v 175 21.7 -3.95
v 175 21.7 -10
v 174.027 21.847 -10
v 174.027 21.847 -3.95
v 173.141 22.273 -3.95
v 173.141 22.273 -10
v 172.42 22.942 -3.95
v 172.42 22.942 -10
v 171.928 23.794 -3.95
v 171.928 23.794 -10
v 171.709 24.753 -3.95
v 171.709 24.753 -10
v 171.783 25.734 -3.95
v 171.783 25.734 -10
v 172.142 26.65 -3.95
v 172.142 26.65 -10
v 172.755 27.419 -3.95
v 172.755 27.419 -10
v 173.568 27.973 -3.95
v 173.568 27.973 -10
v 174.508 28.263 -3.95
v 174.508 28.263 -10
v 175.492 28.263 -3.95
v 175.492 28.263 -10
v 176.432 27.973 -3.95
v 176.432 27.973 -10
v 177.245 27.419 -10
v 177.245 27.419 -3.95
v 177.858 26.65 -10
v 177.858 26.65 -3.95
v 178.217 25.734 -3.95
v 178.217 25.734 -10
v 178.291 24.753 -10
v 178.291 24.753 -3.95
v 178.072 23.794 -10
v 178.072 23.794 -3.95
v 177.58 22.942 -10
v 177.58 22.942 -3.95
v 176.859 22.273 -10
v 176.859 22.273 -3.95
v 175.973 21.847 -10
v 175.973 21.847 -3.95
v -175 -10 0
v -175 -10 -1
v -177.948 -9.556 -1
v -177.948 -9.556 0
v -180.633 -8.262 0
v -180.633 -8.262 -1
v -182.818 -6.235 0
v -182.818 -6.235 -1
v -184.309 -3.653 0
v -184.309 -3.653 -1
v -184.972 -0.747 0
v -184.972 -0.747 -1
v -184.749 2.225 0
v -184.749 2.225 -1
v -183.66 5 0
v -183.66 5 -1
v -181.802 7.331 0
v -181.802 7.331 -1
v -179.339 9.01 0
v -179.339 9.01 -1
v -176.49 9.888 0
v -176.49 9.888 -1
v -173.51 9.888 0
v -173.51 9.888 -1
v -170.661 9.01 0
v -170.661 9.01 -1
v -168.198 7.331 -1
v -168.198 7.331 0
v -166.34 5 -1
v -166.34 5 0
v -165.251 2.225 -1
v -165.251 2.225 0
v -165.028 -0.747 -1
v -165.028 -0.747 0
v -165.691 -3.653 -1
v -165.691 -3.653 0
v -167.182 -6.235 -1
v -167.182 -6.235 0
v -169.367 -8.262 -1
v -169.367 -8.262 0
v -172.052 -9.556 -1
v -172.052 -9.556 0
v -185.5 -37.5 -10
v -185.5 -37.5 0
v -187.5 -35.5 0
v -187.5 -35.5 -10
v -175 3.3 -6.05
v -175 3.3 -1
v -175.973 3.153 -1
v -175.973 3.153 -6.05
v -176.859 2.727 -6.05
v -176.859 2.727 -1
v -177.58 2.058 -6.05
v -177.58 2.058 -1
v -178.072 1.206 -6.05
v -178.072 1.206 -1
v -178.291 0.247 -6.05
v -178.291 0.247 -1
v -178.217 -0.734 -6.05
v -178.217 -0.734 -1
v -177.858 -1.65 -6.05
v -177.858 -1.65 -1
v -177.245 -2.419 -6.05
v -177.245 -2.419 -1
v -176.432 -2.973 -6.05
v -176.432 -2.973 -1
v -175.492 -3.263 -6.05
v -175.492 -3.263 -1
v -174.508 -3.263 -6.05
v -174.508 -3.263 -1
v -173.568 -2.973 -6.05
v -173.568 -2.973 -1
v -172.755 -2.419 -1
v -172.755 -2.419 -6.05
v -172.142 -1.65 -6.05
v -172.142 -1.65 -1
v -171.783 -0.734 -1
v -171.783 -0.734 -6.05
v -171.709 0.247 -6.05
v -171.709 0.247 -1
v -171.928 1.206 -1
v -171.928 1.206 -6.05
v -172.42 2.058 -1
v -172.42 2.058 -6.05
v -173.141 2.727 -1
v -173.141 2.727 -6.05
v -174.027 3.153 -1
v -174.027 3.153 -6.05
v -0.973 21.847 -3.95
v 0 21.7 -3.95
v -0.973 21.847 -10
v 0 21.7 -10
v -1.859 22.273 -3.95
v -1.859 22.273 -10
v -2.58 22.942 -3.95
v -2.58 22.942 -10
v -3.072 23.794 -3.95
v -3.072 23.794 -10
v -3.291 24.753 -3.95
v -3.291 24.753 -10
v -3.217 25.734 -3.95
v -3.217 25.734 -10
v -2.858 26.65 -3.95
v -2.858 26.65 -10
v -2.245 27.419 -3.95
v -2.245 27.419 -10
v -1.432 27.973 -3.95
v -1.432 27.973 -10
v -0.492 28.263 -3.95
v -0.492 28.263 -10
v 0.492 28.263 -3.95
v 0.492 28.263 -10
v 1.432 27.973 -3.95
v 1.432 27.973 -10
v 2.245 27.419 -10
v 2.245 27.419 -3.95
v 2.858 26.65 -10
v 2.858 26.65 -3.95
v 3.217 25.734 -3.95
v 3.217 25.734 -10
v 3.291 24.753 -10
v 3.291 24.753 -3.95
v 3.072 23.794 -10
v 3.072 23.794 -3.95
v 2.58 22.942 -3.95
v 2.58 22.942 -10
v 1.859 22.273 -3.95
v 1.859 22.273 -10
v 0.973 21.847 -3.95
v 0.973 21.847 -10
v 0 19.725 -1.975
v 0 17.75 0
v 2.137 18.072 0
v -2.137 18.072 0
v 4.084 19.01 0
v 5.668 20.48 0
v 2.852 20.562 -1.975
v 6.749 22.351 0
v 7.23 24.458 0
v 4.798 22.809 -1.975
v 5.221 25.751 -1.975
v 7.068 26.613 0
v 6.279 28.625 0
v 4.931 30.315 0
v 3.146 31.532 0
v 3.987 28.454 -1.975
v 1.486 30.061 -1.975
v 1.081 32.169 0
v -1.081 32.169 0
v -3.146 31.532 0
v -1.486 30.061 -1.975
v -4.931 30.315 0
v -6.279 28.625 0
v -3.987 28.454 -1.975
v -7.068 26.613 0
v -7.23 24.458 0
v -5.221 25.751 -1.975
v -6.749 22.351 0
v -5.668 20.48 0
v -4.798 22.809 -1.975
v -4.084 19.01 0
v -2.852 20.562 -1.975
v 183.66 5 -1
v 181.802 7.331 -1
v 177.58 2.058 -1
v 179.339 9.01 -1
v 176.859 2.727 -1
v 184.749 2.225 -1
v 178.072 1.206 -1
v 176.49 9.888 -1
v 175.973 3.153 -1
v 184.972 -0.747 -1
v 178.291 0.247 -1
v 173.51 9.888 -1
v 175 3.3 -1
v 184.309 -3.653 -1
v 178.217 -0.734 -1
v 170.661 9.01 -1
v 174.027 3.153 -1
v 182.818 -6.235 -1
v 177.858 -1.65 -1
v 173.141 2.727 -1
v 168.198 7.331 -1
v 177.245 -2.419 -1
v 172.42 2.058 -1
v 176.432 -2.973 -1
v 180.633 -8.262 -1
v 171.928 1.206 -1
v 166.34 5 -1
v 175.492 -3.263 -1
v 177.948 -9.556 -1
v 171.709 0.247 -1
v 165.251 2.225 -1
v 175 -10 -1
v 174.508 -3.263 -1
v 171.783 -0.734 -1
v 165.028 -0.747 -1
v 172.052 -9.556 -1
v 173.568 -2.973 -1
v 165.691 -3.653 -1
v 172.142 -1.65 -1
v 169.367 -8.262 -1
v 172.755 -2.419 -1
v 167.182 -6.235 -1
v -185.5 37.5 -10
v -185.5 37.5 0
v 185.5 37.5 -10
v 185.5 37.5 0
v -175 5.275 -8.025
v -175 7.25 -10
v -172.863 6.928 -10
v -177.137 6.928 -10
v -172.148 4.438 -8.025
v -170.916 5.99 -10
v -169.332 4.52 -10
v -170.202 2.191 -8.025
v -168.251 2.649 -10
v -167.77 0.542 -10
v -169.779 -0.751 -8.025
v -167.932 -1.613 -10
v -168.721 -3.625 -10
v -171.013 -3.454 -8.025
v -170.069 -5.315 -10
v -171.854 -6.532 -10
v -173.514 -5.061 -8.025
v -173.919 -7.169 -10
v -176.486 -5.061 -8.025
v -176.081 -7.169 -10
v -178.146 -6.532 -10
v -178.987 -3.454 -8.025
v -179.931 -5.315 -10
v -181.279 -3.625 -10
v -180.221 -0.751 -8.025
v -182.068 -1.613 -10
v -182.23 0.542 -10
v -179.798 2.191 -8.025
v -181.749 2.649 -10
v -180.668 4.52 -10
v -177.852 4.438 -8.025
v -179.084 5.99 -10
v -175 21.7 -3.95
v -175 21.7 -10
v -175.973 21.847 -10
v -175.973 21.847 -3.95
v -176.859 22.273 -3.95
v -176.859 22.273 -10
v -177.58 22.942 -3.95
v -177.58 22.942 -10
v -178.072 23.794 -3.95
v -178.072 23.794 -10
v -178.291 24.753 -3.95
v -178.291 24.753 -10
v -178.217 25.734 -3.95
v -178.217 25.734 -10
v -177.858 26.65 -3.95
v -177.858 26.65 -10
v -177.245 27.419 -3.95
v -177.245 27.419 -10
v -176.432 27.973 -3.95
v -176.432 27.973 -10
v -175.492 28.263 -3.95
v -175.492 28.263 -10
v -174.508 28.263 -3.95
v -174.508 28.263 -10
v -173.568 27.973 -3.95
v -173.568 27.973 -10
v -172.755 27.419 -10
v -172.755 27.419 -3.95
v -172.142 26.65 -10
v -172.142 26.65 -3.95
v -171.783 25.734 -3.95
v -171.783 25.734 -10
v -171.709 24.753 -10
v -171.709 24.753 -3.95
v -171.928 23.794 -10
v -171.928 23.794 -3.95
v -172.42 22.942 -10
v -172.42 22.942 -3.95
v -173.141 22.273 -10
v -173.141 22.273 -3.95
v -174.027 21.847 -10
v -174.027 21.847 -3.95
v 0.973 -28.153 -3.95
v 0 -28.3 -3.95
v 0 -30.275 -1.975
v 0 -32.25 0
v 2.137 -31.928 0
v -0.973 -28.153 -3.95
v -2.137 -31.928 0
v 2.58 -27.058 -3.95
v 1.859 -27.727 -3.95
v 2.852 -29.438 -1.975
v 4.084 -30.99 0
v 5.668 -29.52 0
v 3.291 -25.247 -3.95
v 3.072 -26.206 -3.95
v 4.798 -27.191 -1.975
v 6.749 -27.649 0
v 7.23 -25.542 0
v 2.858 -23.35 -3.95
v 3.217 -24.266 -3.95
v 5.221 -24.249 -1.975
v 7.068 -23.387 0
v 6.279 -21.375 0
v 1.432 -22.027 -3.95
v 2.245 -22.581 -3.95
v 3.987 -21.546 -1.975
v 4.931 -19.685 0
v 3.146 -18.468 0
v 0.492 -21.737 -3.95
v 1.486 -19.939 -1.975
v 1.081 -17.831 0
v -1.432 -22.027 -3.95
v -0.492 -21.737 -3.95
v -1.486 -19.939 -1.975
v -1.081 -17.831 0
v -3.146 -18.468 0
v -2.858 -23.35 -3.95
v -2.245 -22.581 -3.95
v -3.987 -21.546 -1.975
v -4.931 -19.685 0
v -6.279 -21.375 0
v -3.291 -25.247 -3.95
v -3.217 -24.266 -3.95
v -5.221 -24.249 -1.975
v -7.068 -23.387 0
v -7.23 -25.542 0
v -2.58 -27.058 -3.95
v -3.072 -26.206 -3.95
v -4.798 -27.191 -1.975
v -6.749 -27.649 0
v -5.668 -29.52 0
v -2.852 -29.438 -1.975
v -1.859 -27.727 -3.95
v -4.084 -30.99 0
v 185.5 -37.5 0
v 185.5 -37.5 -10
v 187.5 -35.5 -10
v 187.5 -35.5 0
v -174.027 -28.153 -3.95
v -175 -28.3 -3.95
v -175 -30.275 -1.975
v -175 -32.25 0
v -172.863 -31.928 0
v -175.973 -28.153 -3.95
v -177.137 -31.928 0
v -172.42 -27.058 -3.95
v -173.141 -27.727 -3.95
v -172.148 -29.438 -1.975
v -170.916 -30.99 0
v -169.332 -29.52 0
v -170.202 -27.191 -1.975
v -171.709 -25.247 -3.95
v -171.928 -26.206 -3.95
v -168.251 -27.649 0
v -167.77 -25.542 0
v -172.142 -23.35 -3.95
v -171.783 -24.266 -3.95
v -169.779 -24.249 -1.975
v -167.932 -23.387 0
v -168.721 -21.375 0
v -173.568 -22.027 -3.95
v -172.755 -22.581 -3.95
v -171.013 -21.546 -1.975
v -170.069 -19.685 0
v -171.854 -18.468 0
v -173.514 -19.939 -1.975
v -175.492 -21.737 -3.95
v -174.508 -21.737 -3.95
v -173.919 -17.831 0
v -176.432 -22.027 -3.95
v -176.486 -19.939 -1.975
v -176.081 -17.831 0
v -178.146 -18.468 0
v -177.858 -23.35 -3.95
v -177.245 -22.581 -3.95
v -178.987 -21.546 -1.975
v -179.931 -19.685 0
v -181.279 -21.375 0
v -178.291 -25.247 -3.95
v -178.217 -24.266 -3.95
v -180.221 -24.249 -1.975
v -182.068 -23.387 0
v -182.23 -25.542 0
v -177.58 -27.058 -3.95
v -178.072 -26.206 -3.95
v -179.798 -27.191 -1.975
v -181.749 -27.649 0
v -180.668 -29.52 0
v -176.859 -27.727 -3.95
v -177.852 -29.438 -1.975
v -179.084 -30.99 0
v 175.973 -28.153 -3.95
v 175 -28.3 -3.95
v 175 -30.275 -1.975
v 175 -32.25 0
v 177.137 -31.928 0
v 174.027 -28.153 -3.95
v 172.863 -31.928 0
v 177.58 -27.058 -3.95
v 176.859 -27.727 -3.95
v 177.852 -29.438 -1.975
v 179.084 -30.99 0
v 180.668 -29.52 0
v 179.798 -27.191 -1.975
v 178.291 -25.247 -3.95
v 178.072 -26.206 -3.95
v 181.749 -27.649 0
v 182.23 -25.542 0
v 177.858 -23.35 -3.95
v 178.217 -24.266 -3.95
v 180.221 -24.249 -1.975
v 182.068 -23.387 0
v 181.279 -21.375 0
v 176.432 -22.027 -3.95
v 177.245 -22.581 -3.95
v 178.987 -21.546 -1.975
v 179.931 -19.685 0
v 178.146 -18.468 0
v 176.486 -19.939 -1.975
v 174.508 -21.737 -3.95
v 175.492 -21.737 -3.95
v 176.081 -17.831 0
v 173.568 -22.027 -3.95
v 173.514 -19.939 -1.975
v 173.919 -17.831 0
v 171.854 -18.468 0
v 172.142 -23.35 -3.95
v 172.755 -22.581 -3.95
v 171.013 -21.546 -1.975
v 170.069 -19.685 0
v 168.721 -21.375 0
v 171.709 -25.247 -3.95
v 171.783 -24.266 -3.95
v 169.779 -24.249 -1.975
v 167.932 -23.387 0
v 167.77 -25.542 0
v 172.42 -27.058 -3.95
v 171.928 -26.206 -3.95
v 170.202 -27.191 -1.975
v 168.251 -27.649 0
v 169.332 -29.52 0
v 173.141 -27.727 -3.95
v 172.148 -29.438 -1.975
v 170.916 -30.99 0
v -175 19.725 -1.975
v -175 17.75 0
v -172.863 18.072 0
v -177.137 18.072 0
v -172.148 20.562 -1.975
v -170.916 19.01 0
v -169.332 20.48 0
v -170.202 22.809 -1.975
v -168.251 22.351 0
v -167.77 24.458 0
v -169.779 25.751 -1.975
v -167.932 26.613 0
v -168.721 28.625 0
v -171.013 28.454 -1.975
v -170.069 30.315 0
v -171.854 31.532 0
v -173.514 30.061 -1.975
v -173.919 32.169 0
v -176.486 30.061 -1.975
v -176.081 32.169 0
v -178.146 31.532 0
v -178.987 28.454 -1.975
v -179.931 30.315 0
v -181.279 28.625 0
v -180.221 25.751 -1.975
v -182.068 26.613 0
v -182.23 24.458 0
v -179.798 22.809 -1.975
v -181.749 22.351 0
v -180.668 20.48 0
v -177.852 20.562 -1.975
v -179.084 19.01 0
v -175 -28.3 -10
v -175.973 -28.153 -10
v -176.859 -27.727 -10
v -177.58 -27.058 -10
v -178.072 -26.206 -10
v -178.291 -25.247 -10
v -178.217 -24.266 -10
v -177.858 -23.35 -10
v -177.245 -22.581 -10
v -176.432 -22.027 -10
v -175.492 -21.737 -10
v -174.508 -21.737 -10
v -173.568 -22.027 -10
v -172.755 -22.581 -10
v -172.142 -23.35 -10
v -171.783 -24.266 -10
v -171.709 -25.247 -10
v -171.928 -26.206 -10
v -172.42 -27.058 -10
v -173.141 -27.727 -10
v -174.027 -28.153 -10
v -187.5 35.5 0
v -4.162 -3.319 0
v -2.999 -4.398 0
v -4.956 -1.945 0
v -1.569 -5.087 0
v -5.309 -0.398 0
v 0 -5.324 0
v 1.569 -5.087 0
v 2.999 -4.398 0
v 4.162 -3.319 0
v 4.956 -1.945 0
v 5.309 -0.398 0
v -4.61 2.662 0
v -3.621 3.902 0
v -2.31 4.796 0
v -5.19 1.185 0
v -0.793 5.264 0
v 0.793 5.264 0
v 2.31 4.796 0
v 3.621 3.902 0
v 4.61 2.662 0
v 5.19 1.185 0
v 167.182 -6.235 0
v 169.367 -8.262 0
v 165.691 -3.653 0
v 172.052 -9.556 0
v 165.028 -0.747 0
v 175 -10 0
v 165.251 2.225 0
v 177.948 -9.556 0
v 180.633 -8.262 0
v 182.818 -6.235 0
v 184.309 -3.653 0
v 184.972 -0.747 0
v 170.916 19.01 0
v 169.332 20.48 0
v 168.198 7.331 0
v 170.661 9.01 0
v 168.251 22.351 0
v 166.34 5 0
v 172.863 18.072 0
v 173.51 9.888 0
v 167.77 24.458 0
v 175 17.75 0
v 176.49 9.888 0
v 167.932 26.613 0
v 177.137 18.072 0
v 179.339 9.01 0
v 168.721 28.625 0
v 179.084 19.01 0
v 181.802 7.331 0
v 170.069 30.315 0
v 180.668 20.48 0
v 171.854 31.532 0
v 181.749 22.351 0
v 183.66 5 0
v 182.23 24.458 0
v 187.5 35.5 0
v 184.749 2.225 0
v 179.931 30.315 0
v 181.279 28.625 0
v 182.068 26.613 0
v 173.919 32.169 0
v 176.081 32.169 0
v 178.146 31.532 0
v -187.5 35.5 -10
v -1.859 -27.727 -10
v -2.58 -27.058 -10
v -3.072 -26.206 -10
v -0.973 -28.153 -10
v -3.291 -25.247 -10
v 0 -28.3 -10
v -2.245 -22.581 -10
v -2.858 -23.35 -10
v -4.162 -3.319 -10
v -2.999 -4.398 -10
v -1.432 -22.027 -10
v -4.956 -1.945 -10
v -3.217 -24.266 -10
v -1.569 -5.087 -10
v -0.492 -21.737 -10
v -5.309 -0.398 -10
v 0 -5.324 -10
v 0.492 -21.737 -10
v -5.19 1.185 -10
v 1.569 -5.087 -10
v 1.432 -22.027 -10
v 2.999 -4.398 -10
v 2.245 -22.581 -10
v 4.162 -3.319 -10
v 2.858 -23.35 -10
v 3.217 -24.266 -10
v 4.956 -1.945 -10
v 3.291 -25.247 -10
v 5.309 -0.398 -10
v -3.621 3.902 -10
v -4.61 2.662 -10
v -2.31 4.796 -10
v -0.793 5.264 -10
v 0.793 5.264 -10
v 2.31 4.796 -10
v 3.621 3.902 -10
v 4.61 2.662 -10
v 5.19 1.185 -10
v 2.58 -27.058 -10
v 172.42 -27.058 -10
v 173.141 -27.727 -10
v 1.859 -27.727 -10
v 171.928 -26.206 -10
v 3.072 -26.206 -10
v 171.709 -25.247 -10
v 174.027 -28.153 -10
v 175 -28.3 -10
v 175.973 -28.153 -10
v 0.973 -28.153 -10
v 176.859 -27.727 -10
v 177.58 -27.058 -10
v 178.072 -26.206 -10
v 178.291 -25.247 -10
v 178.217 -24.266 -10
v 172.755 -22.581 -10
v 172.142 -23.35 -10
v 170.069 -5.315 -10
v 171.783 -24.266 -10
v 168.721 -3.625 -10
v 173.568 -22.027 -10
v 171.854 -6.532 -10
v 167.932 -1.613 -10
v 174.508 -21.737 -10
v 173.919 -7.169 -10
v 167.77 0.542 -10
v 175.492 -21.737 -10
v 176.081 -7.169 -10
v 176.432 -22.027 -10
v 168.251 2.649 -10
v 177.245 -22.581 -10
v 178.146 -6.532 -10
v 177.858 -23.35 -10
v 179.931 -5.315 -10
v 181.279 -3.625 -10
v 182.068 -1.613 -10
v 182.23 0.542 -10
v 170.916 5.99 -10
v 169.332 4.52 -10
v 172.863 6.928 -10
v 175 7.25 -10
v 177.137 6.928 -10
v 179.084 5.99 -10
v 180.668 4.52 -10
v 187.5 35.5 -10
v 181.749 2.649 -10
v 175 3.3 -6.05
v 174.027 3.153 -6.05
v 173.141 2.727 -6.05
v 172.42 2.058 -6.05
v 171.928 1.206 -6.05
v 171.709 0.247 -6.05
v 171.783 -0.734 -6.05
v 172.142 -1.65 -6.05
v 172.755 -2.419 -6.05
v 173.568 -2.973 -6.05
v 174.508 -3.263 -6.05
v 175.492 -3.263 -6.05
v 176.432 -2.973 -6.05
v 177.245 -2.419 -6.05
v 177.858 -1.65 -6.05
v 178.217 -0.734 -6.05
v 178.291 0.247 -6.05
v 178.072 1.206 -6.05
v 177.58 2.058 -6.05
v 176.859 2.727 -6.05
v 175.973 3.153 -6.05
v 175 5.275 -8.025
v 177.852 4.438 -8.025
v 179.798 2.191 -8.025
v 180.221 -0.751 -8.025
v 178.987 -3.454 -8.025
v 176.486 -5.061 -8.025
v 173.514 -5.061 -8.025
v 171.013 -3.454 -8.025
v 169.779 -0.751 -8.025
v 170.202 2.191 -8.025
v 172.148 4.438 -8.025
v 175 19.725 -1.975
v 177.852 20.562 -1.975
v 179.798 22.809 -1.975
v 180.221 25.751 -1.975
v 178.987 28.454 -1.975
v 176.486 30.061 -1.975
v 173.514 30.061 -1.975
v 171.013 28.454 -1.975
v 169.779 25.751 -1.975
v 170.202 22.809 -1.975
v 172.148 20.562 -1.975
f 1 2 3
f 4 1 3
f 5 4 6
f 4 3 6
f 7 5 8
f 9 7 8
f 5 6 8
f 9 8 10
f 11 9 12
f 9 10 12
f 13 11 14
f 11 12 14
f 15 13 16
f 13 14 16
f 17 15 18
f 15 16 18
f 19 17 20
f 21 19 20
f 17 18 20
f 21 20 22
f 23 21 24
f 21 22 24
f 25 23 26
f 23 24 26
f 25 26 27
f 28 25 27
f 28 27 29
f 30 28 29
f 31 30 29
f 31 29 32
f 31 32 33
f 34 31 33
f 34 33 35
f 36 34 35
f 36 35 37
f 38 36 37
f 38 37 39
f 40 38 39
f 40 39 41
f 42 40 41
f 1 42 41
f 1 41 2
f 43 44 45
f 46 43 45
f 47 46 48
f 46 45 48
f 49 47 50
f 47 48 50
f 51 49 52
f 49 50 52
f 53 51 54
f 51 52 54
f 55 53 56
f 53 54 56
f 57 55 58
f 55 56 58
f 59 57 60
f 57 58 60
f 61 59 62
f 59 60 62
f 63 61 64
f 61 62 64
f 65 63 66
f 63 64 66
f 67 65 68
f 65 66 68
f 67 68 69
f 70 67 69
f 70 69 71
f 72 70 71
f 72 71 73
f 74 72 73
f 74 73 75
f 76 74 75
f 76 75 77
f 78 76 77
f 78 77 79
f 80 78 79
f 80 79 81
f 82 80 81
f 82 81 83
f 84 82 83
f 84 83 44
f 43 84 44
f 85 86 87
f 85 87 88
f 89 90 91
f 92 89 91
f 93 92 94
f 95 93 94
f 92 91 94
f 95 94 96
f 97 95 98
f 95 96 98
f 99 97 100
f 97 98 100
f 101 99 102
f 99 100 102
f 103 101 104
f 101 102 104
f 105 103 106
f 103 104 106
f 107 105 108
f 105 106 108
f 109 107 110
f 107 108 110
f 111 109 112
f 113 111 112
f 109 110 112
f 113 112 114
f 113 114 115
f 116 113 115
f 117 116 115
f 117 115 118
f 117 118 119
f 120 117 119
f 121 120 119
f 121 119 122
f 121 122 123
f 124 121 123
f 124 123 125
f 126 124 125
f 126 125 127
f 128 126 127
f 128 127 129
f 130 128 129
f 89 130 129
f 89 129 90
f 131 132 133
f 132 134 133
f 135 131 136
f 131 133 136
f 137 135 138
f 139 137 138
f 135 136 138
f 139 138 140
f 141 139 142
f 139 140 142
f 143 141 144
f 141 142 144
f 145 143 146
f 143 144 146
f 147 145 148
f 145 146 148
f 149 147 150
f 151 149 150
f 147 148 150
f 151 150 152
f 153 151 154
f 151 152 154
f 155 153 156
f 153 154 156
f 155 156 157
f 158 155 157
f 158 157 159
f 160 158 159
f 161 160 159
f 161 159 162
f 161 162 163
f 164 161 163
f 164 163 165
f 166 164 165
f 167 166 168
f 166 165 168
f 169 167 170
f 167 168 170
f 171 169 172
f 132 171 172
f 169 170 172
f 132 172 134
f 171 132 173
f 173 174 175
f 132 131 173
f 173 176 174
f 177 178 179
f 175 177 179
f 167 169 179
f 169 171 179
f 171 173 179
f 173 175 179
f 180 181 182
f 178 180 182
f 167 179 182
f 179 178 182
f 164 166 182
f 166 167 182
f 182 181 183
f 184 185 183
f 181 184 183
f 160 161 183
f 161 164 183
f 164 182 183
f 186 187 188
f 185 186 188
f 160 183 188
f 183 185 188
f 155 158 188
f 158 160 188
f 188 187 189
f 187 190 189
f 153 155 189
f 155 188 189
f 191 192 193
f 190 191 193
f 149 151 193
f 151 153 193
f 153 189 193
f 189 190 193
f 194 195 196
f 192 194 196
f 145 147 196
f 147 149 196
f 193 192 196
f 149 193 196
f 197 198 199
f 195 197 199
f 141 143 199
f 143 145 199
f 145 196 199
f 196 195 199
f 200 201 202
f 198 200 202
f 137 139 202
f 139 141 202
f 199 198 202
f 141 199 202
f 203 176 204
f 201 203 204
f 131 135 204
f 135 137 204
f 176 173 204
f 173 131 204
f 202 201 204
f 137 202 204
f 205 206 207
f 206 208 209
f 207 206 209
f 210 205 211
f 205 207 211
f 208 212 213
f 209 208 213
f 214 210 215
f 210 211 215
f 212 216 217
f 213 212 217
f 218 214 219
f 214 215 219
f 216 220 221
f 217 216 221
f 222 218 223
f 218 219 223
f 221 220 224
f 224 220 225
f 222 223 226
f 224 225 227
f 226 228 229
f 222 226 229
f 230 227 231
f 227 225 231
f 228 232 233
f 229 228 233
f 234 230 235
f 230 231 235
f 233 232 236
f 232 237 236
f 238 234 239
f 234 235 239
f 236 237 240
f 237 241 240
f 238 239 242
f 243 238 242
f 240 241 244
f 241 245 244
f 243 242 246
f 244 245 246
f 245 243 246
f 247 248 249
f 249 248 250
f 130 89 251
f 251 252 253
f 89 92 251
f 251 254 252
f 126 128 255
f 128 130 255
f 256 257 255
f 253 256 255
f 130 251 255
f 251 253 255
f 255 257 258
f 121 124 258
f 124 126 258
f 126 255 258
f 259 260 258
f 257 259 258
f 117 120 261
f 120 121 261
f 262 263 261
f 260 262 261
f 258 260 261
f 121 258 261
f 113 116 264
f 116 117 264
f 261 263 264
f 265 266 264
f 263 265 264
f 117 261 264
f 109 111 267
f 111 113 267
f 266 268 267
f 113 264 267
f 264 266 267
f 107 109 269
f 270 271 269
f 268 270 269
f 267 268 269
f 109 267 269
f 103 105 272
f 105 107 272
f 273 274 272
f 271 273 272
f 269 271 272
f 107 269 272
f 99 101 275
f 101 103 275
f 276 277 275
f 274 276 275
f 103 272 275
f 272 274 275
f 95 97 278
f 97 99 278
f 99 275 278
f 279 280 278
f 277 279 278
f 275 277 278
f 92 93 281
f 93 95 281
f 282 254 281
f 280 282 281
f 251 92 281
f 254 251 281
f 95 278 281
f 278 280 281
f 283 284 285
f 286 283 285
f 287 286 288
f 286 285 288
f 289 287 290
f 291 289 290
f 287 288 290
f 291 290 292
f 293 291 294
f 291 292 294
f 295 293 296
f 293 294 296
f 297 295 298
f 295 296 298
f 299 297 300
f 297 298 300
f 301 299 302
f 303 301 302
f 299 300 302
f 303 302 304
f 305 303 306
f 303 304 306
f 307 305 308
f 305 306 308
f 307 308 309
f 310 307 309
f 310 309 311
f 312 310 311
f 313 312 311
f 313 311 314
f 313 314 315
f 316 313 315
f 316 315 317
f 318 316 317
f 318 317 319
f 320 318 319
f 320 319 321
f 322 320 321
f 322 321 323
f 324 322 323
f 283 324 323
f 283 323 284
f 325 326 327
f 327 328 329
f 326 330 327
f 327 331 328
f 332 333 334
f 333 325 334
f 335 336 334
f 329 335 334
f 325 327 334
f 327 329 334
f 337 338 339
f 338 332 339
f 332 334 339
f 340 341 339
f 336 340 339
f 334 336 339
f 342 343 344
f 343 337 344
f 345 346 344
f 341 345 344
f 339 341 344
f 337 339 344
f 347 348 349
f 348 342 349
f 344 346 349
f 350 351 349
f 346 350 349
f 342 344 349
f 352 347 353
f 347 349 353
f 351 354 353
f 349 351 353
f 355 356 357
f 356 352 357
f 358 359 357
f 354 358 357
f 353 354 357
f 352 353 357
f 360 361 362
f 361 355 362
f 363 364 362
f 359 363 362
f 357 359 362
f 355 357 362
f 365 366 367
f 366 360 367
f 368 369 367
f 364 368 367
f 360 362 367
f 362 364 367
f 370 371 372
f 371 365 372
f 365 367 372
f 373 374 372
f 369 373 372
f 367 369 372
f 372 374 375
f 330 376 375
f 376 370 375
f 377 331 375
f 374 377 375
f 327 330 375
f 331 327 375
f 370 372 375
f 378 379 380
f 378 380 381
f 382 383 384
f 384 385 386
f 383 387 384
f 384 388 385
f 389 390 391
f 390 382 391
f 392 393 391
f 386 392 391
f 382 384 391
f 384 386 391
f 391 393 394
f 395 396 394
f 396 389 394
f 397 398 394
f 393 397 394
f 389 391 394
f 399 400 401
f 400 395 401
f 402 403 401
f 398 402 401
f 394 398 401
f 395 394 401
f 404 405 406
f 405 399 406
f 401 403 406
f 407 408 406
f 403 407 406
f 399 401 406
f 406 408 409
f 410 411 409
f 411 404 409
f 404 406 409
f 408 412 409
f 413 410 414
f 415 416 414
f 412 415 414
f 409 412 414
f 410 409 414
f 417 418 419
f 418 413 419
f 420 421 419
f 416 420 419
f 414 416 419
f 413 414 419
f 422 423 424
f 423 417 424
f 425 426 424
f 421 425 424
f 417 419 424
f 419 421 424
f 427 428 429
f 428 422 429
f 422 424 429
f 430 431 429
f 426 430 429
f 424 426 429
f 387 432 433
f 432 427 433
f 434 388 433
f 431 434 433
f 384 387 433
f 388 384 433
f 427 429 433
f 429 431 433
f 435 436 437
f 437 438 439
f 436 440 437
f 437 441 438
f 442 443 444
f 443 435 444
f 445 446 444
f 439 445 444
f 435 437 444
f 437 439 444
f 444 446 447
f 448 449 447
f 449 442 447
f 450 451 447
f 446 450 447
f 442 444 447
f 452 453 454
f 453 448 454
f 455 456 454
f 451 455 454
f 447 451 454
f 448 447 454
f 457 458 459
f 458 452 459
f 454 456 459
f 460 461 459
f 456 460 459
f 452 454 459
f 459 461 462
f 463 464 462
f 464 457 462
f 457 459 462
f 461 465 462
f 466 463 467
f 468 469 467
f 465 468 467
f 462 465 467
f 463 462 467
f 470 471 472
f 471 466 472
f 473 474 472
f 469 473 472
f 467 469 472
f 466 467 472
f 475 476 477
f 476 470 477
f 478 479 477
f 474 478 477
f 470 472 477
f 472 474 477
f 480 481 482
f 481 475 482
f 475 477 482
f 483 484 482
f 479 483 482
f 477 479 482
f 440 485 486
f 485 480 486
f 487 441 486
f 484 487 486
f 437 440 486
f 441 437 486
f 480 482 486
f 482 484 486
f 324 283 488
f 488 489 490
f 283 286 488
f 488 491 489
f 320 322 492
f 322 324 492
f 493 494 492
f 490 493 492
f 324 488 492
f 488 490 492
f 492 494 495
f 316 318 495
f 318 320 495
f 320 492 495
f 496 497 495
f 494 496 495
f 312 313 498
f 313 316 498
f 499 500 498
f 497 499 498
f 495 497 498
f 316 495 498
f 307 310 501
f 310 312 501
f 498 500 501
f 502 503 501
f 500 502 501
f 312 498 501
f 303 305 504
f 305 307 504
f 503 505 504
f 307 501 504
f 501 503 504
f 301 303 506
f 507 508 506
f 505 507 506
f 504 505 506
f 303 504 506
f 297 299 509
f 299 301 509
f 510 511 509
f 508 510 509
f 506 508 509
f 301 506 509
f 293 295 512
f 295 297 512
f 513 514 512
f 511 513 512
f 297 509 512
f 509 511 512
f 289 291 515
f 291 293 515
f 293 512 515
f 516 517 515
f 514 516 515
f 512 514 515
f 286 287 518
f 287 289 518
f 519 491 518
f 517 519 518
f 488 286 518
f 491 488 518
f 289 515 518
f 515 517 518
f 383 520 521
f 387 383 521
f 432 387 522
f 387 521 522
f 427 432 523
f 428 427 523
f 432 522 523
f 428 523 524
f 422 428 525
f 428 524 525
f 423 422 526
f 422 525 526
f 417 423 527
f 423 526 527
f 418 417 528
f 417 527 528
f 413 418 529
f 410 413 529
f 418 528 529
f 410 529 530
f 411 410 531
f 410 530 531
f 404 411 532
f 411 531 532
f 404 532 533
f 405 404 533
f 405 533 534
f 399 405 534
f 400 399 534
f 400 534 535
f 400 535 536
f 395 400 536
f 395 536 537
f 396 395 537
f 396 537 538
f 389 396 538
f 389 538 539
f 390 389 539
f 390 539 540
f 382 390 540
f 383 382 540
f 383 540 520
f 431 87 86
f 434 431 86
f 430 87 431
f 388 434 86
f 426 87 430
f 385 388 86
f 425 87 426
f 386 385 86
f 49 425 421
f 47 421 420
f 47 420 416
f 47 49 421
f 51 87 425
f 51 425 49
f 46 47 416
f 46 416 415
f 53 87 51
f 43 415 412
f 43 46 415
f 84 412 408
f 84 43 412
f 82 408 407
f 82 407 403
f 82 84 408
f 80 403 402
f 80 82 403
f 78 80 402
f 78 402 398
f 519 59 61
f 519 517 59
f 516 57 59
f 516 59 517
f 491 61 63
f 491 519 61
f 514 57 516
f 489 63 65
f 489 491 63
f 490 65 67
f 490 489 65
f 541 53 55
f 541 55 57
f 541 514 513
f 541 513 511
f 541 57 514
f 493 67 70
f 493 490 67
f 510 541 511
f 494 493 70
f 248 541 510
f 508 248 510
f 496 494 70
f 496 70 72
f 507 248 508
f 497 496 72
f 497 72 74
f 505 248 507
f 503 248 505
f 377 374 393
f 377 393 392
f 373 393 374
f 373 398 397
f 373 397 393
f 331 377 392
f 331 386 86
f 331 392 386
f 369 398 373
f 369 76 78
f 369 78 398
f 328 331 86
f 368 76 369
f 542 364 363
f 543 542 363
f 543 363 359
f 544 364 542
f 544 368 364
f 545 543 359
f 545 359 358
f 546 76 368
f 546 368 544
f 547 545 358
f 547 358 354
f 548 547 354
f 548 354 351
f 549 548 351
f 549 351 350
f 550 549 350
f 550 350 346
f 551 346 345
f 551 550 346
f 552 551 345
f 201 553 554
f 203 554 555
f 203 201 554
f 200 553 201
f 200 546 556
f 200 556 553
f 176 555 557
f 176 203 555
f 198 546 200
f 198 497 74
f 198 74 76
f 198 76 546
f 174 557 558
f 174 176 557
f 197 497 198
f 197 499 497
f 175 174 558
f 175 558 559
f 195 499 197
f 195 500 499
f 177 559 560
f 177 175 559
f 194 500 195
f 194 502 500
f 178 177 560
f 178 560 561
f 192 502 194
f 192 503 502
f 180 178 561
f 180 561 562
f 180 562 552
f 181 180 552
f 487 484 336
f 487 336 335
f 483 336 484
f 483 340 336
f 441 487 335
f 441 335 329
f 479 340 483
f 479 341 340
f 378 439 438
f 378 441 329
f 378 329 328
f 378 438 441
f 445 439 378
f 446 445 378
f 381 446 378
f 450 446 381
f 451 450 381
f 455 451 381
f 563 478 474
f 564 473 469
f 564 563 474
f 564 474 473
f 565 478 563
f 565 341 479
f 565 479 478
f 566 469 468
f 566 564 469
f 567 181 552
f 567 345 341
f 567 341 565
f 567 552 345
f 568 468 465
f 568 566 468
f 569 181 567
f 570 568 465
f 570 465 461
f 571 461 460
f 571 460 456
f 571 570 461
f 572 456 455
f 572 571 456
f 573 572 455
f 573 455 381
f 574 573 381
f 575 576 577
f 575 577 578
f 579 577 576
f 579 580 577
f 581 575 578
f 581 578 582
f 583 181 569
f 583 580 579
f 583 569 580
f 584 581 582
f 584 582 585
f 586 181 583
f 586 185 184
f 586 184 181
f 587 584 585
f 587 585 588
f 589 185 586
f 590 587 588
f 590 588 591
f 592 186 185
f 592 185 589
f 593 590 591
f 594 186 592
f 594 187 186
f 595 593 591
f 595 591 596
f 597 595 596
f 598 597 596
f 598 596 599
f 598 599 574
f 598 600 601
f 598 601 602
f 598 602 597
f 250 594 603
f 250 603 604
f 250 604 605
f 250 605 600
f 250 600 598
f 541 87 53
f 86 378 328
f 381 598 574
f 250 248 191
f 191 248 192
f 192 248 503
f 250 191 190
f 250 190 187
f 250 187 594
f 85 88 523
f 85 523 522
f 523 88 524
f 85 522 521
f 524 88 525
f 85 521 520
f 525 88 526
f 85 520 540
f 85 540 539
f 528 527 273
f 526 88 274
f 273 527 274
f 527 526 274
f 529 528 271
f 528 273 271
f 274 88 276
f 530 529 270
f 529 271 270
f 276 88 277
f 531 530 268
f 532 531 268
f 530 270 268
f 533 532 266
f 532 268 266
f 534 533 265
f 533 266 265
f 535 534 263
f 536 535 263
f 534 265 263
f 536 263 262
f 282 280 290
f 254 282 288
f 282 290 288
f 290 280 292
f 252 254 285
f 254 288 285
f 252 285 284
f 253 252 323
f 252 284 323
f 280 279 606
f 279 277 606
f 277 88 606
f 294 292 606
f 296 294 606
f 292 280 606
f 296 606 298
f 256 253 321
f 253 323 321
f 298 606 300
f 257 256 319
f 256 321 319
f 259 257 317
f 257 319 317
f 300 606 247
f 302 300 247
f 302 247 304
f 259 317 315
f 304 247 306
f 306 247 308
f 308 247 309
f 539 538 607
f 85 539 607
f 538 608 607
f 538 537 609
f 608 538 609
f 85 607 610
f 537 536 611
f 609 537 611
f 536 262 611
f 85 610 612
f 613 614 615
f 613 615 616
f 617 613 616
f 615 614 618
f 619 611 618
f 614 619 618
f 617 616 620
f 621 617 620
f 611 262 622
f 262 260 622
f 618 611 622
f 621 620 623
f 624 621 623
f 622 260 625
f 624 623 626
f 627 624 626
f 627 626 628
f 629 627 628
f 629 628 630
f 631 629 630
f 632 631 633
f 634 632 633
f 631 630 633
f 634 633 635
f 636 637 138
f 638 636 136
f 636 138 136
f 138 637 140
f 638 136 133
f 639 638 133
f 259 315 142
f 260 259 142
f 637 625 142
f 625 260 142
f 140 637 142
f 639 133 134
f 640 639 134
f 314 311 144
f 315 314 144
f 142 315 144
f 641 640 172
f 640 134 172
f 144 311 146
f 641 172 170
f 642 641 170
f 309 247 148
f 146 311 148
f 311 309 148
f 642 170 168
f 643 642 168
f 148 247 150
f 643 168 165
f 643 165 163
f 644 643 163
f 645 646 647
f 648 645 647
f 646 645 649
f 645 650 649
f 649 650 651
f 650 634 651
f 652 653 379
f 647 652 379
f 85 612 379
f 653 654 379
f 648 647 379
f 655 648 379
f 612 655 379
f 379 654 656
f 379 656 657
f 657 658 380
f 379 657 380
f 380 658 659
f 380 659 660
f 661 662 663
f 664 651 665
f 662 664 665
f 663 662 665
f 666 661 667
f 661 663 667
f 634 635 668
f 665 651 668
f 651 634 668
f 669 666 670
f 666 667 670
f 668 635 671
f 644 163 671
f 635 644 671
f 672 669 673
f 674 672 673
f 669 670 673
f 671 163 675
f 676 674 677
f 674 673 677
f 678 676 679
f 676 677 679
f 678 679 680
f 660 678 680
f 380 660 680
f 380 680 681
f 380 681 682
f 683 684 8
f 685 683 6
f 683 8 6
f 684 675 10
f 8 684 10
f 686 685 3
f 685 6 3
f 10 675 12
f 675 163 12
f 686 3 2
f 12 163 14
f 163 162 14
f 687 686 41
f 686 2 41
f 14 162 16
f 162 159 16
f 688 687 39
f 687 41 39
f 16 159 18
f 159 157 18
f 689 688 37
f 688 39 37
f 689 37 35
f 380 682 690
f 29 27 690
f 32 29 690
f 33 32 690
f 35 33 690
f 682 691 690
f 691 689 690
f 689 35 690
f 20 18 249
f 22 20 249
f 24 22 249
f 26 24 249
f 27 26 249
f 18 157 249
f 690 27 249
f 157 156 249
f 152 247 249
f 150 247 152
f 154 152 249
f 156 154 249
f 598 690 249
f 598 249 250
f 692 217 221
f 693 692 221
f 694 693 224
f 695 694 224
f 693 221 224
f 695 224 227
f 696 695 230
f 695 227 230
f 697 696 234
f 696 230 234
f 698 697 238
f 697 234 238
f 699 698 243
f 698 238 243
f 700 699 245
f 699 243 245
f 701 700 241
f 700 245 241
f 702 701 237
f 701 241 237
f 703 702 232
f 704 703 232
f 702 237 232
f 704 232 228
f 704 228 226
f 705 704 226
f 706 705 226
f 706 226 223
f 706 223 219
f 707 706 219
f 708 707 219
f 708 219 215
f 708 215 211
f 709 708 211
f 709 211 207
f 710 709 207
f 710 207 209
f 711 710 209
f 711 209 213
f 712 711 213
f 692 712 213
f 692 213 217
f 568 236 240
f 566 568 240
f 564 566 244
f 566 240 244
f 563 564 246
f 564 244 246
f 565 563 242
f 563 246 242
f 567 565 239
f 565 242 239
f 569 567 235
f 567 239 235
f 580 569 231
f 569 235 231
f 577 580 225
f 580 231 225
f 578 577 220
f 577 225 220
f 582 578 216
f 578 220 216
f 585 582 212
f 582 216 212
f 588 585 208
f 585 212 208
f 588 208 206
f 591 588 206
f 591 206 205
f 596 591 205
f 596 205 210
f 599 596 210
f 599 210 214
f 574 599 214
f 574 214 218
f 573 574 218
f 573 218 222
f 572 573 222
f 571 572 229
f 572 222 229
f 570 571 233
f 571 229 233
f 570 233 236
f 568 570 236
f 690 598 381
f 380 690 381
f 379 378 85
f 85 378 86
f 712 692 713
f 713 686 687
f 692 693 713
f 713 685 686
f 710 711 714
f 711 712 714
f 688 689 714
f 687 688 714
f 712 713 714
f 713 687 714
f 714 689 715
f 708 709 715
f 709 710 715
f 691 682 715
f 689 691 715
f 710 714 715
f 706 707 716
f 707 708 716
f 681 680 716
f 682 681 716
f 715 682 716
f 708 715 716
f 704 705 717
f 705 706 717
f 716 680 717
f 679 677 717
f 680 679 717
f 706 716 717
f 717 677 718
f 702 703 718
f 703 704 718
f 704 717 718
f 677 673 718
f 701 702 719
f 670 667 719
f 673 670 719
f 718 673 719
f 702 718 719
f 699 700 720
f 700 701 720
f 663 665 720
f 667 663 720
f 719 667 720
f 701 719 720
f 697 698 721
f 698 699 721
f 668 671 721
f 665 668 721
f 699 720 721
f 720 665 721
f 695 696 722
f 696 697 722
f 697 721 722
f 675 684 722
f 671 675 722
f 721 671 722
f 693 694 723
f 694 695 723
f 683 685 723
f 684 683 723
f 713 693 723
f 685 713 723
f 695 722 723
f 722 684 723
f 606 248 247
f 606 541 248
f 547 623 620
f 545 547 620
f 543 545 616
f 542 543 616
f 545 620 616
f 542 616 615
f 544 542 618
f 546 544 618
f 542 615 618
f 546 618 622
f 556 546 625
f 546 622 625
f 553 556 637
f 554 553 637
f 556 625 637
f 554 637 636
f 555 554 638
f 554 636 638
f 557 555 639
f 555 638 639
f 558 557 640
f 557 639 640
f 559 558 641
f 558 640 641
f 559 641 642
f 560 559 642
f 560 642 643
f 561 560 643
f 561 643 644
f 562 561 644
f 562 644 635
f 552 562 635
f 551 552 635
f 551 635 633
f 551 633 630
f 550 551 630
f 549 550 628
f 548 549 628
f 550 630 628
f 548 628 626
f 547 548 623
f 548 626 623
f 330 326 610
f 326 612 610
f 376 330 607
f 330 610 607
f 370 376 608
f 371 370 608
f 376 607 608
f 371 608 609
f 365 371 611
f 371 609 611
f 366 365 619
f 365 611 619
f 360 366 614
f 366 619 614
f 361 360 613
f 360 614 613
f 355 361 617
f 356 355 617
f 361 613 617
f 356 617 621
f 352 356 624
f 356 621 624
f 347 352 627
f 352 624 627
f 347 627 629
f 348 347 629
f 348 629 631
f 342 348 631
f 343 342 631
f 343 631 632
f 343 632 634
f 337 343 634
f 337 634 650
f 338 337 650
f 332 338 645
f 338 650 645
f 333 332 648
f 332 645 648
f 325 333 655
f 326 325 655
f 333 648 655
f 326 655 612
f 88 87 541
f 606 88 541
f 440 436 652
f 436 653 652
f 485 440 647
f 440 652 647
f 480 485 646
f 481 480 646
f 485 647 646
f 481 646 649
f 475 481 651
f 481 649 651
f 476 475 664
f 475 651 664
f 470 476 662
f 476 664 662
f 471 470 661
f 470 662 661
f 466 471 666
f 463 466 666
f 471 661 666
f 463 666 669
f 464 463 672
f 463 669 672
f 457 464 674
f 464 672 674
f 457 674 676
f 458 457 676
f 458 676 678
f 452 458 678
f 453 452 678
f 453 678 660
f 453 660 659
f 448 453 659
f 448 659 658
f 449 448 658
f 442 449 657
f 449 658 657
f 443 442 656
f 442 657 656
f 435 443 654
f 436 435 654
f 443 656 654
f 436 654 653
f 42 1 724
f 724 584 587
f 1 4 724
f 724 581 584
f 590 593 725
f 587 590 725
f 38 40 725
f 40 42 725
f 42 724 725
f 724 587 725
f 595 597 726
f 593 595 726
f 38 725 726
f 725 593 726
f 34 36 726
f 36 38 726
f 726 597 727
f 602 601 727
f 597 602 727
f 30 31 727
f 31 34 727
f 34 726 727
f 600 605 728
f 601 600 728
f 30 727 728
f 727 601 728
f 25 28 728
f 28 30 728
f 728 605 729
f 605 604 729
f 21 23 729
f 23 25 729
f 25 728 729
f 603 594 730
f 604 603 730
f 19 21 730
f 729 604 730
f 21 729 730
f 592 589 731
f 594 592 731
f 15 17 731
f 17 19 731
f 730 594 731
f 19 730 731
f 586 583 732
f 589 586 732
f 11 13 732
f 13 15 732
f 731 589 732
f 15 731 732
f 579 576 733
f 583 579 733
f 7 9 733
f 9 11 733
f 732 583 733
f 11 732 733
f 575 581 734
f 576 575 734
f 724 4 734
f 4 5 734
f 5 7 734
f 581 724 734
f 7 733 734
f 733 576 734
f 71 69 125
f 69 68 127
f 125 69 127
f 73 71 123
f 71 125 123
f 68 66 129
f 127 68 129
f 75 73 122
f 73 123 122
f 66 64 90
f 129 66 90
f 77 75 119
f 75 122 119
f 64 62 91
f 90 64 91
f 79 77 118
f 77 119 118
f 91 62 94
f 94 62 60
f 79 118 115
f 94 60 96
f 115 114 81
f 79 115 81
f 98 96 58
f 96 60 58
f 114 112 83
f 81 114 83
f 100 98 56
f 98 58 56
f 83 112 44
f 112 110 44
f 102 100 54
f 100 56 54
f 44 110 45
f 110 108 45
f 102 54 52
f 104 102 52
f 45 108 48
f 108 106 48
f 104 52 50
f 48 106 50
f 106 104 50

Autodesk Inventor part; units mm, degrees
ref_plane "YZ Plane" through (0, 0, 0) normal (1, 0, 0) x (0, 1, 0)
ref_plane "XZ Plane" through (0, 0, 0) normal (0, 1, 0) x (-1, 0, 0)
ref_plane "XY Plane" through (0, 0, 0) normal (0, 0, 1) x (1, 0, 0)
sketch "Sketch1" plane through (0, 0, 0) normal (0, 0, 1) x (1, 0, 0)
  line L0 (-262.5, 0) -> (262.5, 0) construction
  line L1 (0, -52.5) -> (0, 52.5) construction
  line L2 (-187.5, 37.5) -> (187.5, 37.5)
  line L3 (187.5, 37.5) -> (187.5, -37.5)
  line L4 (187.5, -37.5) -> (-187.5, -37.5)
  line L5 (-187.5, -37.5) -> (-187.5, 37.5)
  point P0 (-175, 25)
  point P1 (175, 25)
  point P2 (-175, -25)
  point P3 (175, -25)
  point P4 (0, 0)
  point P5 (-175, 0)
  point P6 (175, 0)
  point P7 (0, 25)
  point P8 (0, -25)
  dimension "d0" = 375
  dimension "d1" = 75
  dimension "d3" = 350
  dimension "d30" = 12.5
  dimension "d45" = 12.5
extrude "Extrusion1" add sketch "Sketch1" against normal blind 10
hole "Hole1" at (-175, 25, 0) at (175, 25, 0) at (-175, -25, 0) at (175, -25, 0) at (0, 25, 0) at (0, -25, 0) direction (0, 0, -1) diameter 6.6 end through all countersink diameter 14.5 countersink angle 90 clearance for "Countersunk Flat Head Hex Socket Screw ISO 10642" size "M6" standard "ISO"
hole "Hole2" at (0, 0, 0) direction (0, 0, -1) diameter 10.647 end through all thread size "M12x1.25" class "6H" standard "ISO Metric profile"
hole "Hole3" at (-175, 0, 0) at (175, 0, 0) direction (0, 0, -1) diameter 20 depth 1
sketch "Sketch2" plane through (0, 0, -10) normal (0, 0, -1) x (-1, 0, 0)
  circle A0 centre (175, 0) radius 10 projected
  circle A1 centre (-175, 0) radius 10 projected
  point P0 (0, 0)
hole "Hole4" at (-175, 0, -10) at (175, 0, -10) direction (0, 0, 1) diameter 6.6 end through all countersink diameter 14.5 countersink angle 90 clearance for "Countersunk Flat Head Hex Socket Screw ISO 10642" size "M6" standard "ISO"
chamfer "Chamfer1" distance 2 angle 45 4 edges at (-187.5, 37.5, -5) (-187.5, -37.5, -5) (187.5, 37.5, -5) (187.5, -37.5, -5)
equation "\"d45\" = d30"
properties part number "DLT-01-235B" material "Aluminio 1060"
